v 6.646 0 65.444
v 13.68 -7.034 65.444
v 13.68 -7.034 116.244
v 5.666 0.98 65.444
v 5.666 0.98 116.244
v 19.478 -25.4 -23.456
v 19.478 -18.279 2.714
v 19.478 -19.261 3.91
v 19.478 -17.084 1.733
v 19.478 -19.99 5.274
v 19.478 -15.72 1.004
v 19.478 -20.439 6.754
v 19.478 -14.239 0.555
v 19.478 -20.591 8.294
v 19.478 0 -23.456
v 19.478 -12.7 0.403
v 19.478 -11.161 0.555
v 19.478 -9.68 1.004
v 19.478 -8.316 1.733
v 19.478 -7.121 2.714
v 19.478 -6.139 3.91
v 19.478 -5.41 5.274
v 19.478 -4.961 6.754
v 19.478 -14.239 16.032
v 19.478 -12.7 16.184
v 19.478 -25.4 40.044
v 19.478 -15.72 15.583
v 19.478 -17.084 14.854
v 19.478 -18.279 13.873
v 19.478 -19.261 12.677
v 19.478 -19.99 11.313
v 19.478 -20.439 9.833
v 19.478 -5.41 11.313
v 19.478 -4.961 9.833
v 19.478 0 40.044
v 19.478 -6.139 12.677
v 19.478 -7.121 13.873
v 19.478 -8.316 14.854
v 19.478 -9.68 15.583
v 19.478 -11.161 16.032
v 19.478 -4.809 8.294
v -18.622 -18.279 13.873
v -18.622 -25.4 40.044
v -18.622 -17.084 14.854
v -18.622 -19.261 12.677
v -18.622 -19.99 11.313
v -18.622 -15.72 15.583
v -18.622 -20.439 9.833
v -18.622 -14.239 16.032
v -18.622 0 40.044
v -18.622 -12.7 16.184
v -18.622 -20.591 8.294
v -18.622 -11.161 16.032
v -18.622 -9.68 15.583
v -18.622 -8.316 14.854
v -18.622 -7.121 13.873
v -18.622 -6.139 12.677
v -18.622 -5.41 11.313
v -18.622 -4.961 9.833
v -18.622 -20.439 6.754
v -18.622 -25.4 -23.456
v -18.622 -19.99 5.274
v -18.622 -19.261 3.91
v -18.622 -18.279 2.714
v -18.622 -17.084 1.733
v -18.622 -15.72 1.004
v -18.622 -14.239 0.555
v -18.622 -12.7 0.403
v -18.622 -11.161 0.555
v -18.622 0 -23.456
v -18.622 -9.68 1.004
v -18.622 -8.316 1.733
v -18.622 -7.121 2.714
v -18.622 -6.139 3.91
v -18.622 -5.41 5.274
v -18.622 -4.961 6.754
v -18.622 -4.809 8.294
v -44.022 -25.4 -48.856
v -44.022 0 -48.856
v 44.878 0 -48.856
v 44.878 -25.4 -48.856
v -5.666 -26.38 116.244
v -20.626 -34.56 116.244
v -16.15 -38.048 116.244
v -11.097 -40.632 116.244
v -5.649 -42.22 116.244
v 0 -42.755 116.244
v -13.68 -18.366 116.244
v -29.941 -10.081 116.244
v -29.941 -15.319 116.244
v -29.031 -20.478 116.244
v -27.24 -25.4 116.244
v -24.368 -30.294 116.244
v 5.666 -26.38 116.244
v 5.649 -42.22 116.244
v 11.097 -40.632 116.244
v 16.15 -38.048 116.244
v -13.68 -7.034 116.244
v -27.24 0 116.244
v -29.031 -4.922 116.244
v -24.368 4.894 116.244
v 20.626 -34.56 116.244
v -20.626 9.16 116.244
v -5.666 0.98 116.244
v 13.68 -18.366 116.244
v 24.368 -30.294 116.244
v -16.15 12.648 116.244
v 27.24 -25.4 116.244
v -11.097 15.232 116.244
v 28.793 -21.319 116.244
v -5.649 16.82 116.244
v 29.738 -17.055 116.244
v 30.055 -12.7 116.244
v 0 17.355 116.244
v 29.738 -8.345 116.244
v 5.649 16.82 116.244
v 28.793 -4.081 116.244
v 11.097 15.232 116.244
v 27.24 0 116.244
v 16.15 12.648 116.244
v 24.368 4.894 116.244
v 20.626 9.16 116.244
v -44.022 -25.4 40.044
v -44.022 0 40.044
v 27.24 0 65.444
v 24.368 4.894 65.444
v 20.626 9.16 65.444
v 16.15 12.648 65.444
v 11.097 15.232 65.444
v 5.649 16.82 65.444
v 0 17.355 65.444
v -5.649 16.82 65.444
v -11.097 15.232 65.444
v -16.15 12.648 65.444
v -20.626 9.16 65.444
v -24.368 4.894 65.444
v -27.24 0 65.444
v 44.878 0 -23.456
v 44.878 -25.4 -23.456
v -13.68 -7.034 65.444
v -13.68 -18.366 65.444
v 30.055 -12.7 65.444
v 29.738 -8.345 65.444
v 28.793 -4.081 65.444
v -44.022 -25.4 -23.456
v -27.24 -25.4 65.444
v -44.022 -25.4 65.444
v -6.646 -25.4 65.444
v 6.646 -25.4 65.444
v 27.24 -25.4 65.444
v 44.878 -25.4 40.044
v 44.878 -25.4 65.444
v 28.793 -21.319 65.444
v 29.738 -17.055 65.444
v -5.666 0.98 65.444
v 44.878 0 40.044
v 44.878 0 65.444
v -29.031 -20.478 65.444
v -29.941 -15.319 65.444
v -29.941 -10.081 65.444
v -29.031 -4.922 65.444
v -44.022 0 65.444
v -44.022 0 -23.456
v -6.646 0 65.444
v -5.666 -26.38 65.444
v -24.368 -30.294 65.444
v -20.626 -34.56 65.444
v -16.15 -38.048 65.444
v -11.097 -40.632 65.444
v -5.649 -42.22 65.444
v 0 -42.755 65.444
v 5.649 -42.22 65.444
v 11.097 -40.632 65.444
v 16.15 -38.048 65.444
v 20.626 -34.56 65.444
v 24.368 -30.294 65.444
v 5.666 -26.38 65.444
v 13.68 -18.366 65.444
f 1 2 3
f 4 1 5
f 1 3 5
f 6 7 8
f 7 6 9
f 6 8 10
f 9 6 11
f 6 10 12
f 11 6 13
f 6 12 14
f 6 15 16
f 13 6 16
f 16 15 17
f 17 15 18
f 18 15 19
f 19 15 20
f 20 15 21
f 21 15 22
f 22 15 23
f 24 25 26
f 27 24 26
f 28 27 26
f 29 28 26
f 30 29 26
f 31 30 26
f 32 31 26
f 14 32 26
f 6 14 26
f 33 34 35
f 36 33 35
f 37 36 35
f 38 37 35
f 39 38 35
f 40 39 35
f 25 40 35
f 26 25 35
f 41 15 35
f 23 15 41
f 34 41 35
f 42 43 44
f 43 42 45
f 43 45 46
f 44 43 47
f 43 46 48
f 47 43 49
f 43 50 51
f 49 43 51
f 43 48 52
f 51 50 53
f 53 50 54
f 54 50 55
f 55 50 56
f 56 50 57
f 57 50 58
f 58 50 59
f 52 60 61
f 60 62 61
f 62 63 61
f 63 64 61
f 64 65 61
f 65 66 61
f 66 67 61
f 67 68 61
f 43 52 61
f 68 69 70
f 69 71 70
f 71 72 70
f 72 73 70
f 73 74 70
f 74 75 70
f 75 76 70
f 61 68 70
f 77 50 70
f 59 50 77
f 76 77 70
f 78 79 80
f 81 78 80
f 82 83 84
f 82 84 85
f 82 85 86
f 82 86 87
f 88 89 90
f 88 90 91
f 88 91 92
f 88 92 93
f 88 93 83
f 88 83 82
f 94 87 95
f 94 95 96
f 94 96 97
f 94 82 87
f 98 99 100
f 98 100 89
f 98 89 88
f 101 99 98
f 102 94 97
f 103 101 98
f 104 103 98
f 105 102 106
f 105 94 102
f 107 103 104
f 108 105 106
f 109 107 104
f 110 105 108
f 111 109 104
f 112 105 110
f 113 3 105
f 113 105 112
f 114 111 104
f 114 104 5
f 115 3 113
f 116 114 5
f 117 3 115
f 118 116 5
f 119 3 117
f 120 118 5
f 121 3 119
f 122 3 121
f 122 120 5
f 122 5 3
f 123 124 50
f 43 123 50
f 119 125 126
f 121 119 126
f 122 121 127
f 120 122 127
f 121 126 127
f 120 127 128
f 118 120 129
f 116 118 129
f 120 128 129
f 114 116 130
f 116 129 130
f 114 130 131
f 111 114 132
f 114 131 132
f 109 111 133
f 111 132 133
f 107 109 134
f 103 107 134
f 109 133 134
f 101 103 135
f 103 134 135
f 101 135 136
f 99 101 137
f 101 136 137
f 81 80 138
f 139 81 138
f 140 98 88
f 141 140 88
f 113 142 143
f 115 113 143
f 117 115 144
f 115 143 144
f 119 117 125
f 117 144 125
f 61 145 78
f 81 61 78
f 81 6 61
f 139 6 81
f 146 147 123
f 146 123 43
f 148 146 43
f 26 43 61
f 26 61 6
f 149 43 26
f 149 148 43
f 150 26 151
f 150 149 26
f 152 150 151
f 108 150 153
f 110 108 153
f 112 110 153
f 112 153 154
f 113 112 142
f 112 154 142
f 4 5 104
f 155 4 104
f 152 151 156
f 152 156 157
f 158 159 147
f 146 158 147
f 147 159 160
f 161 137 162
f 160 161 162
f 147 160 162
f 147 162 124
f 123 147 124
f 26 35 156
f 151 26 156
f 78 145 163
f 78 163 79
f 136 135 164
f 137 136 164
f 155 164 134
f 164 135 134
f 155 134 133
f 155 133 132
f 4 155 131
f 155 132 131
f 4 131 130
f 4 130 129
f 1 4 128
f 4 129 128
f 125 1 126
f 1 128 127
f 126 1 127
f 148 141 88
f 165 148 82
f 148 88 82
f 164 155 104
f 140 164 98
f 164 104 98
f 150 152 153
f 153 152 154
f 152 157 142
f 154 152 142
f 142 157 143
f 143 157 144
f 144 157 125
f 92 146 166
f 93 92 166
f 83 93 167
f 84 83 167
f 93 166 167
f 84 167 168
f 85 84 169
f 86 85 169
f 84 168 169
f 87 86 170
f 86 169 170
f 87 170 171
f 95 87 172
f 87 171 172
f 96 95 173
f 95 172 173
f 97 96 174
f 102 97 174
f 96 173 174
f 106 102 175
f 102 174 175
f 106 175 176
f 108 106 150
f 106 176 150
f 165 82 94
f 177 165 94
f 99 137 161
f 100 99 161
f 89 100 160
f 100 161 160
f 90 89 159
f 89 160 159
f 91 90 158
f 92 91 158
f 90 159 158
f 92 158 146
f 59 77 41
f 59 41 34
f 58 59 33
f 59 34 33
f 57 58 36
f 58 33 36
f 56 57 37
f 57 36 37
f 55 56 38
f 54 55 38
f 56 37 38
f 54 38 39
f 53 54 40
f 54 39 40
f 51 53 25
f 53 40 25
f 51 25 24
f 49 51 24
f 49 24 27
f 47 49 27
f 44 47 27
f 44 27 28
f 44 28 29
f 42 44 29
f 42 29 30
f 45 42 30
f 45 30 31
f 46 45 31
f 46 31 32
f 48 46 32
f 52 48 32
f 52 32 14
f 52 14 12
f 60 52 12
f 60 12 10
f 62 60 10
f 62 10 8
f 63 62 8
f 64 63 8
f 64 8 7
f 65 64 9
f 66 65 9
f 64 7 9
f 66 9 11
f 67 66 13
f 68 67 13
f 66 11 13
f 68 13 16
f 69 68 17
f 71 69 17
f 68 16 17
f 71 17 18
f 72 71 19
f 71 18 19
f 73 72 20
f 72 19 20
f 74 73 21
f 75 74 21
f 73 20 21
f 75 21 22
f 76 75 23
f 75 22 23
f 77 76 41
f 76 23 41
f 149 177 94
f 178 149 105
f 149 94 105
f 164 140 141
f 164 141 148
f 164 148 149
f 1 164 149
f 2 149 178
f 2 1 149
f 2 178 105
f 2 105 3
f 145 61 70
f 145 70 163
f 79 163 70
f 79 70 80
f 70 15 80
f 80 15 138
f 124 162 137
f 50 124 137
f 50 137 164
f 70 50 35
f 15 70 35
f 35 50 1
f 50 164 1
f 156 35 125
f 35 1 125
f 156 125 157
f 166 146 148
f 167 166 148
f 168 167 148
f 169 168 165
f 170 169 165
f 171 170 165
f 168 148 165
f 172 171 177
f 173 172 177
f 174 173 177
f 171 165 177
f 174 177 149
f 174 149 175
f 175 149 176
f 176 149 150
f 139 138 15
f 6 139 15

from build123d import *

# Parameters (mm, degrees)
F1_DEPTH = 25.4
F2_R     = 7.890546565
F3_DEPTH = 63.501
F5_DEPTH = 50.8
F7_DEPTH = 50.8


with BuildPart() as f1:
    # F0 (on Front) → F1 (new body)
    with BuildSketch(Plane.XZ):
        Polygon((-44.0221392334, -23.4564554393), (-44.0221392334, -48.8564554393), (44.8778607666, -48.8564554393), (44.8778607666, -23.4564554393), (19.4778607666, -23.4564554393), (19.4778607666, 40.0435445607), (44.8778607666, 40.0435445607), (44.8778607666, 65.4435445607), (-44.0221392334, 65.4435445607), (-44.0221392334, 40.0435445607), (-18.6221392334, 40.0435445607), (-18.6221392334, -23.4564554393), align=None)
    extrude(amount=F1_DEPTH)

    # F2 (on face) → F3 (cut, through all)
    with BuildSketch(Plane.YZ.offset(19.4778607666)):
        with Locations((-12.7, 8.2935445607)):
            Circle(F2_R)
    extrude(amount=-F3_DEPTH, mode=Mode.SUBTRACT)

    # F4 (on face) → F5 (join)
    with BuildSketch(Plane.XY.offset(65.4435445607)):
        with BuildLine():
            Line((-27.2401830653, 0), (27.2401830653, 0))
            ThreePointArc((27.2401830653, 0), (0, 17.3552420291), (-27.2401830653, 0))
        make_face()
        with BuildLine():
            ThreePointArc((-27.2401830653, -25.4), (0, -42.7552420291), (27.2401830653, -25.4))
            Line((27.2401830653, -25.4), (-27.2401830653, -25.4))
        make_face()
        with BuildLine():
            ThreePointArc((27.2401830653, -25.4), (29.3430389392, -19.2041247868), (30.0552420291, -12.7))
            ThreePointArc((30.0552420291, -12.7), (29.3430389392, -6.1958752132), (27.2401830653, 0))
            Line((27.2401830653, 0), (-27.2401830653, 0))
            ThreePointArc((-27.2401830653, 0), (-30.0552420291, -12.7), (-27.2401830653, -25.4))
            Line((-27.2401830653, -25.4), (27.2401830653, -25.4))
        make_face()
    extrude(amount=F5_DEPTH)

    # F6 (on face) → F7 (cut)
    with BuildSketch(Plane.XY.offset(116.2435445607)):
        Polygon((13.6795025319, -18.3662354752), (13.6795025319, -7.0337645248), (5.6662354752, 0.9795025319), (-5.6662354752, 0.9795025319), (-13.6795025319, -7.0337645248), (-13.6795025319, -18.3662354752), (-5.6662354752, -26.3795025319), (5.6662354752, -26.3795025319), align=None)
    extrude(amount=-F7_DEPTH, mode=Mode.SUBTRACT)


solid = f1.part
